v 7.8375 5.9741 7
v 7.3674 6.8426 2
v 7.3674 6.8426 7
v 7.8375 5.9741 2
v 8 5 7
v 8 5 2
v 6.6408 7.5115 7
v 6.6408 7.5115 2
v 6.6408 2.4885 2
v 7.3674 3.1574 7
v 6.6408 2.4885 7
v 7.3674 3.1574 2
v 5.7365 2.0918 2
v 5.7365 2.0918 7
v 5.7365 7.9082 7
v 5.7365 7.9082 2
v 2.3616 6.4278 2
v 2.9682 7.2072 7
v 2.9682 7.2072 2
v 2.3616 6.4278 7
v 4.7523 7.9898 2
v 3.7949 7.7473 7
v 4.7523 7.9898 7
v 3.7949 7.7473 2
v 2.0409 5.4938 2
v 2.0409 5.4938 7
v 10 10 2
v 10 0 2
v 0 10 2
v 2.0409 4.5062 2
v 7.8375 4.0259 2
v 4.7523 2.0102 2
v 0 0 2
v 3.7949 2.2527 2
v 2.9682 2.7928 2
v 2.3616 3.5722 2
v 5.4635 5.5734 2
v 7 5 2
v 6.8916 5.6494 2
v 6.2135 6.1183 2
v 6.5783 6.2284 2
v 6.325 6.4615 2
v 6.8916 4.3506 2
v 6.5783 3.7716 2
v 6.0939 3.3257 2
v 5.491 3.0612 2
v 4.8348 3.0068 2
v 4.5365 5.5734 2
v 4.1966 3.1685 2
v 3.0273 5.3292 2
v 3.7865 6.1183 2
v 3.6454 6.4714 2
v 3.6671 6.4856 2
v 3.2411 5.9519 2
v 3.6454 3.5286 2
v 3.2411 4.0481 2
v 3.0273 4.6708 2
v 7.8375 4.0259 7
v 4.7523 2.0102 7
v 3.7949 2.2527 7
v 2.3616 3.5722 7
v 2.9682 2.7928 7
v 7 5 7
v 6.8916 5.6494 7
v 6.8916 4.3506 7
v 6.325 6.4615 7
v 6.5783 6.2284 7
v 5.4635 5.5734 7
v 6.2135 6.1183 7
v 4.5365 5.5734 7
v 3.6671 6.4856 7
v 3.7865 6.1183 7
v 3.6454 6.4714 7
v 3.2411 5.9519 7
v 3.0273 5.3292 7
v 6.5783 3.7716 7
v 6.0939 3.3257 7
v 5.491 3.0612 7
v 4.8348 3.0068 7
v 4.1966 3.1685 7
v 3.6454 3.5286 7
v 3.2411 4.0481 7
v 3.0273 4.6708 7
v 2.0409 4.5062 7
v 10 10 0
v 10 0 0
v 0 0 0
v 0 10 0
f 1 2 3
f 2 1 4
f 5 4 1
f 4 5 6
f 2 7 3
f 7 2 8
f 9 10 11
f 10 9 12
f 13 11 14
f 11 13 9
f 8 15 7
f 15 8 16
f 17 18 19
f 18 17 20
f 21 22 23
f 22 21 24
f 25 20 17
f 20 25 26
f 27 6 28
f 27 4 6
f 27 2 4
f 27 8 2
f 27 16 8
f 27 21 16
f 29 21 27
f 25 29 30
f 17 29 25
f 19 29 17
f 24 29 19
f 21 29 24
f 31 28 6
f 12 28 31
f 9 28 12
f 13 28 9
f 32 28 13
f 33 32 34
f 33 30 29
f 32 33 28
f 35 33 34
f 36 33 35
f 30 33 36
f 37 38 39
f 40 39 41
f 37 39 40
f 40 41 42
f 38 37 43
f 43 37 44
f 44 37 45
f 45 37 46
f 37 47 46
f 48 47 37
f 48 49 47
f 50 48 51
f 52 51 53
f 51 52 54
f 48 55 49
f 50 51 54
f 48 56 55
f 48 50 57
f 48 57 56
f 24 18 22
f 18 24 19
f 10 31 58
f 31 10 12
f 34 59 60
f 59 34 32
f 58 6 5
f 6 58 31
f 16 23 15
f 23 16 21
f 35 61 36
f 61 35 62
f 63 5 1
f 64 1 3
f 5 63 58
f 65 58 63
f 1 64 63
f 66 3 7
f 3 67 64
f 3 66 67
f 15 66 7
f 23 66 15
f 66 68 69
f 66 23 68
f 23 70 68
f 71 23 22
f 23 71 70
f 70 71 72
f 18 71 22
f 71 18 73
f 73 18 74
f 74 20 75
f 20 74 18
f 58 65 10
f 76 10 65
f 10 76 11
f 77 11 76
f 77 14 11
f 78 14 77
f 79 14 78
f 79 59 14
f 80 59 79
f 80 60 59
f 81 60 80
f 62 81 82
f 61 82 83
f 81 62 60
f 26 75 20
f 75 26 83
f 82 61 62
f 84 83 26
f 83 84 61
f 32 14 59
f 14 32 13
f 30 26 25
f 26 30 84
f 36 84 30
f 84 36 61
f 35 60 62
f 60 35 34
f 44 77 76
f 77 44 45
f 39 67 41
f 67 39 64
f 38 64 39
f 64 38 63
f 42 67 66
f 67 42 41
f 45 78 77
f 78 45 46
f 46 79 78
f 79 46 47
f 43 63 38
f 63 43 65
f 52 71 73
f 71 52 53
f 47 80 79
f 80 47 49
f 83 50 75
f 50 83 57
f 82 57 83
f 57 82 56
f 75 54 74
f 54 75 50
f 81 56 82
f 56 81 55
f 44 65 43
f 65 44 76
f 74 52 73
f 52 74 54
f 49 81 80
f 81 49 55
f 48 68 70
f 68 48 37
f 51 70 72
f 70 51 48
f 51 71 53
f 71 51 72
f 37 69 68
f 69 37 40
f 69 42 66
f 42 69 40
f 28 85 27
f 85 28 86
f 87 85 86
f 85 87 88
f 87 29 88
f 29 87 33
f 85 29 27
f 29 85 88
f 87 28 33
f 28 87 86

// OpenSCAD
// file: constants.scad
connectors_notched_circle_thickness = 2;
connectors_notched_circle_notch_diameter = 3;
connectors_notched_circle_loose_length = 1;
connectors_notched_circle_loose_to_tight_length = 1;
// file: ../../utilities/cylinders.scad
// Calculates the $fn which should be used for a cylinder of a specific size.
function cylinder_sides(
  // The diameter of the cylinder.
  diameter
) = ceil(
  max(
    min(
      360 / $fa,
      diameter * PI / $fs
    ),
    8
  )
);

// Generates a grid of square perforations through a cylinder of a specific
// size.
module cylinder_perforations(
  // The diameter of the cylinder.
  diameter,
  // The height of the cylinder.
  length,
  // The size (width/height) of each perforation.
  perforation_size,
  // The target spacing between perforations.  This will be adjusted to fit
  // evenly on the cylinder.
  perforation_spacing
) {
  half_perimeter = diameter * PI / 2;
  angularPerforations = round(half_perimeter / perforation_spacing);
  zPerforations = round(half_perimeter / perforation_spacing);
  for (angle = [0:180 / angularPerforations:180]) {
    rotate([0, 0, angle]) {
      for (z = [perforation_spacing:perforation_spacing:length - perforation_spacing]) {
        translate([0, 0, z]) {
          cube([diameter, perforation_size, perforation_size], center = true);
        };
      }
    };
  };
};

// Generates a "pipe" which lofts a sequence of circles together.
module cylinder_sequence(
  // The diameter of the first circle.
  initial_diameter,
  // An array of arrays, where each child array is two numbers:
  // - The length of the segment along Z.
  // - The diameter of the end of the segment.
  length_diameter_pairs,
  // The number of sides of all circles drawn.
  sides,
  // Used for recursion; leave as default.
  i = 0
) {
  if (i < len(length_diameter_pairs)) {
    cylinder(
      d1 = initial_diameter,
      d2 = length_diameter_pairs[i][1],
      h = length_diameter_pairs[i][0],
      $fn = sides
    );
    translate([
      0,
      0,
      length_diameter_pairs[i][0]
    ]) {
      cylinder_sequence(
        length_diameter_pairs[i][1],
        length_diameter_pairs,
        sides,
        i + 1
      );
    };
  };
};
// file: male.scad
include <../../settings.scad>;
use <../../utilities/cylinders.scad>;
include <constants.scad>;

// Renders the male counterpart of a circular connector with an orienting notch.
// Place on the surface oriented so that Z+ is the surface normal.
module connectors_notched_circle_male(
    // The outer diameter of the male circle.
    diameter,
    // The length of the male circle.
    length,
    // The number of notches, spaced evenly.
    notches
) {
  union() {
    difference() {
      cylinder(
        d = diameter,
        h = length,
        $fn = cylinder_sides(diameter)
      );
      cylinder(
        d = diameter - connectors_notched_circle_thickness,
        h = length,
        $fn = cylinder_sides(diameter)
      );
    };
    intersection() {
      for (notch = [0:notches - 1]) {
        rotate([0, 0, notch * 360 / notches]) {
          translate([
            0,
            diameter / 2 - connectors_notched_circle_thickness / 2,
            0
          ]) {
            cylinder(
              d = connectors_notched_circle_notch_diameter,
              h = length,
              $fn = cylinder_sides(connectors_notched_circle_notch_diameter)
            );
          };
        };
      };
      cylinder(
        d = diameter,
        h = length,
        $fn = cylinder_sides(diameter)
      );
    };
  };
};
// file: ../../settings.scad
// When true, lower resolution primitives will be used.
draft = false;

$fs = draft ? 2 : 1;
$fa = draft ? 12 : 6;

// The amount of space left between parts which must fit together tightly.
tight_tolerance = 0.6;

// The amount of space left between parts which must fit together loosely.
loose_tolerance = 1;
// main file
include <../../settings.scad>;
use <male.scad>;

cube([10, 10, 2]);
translate([5, 5, 2]) {
  connectors_notched_circle_male(6, 5, 1);
};
